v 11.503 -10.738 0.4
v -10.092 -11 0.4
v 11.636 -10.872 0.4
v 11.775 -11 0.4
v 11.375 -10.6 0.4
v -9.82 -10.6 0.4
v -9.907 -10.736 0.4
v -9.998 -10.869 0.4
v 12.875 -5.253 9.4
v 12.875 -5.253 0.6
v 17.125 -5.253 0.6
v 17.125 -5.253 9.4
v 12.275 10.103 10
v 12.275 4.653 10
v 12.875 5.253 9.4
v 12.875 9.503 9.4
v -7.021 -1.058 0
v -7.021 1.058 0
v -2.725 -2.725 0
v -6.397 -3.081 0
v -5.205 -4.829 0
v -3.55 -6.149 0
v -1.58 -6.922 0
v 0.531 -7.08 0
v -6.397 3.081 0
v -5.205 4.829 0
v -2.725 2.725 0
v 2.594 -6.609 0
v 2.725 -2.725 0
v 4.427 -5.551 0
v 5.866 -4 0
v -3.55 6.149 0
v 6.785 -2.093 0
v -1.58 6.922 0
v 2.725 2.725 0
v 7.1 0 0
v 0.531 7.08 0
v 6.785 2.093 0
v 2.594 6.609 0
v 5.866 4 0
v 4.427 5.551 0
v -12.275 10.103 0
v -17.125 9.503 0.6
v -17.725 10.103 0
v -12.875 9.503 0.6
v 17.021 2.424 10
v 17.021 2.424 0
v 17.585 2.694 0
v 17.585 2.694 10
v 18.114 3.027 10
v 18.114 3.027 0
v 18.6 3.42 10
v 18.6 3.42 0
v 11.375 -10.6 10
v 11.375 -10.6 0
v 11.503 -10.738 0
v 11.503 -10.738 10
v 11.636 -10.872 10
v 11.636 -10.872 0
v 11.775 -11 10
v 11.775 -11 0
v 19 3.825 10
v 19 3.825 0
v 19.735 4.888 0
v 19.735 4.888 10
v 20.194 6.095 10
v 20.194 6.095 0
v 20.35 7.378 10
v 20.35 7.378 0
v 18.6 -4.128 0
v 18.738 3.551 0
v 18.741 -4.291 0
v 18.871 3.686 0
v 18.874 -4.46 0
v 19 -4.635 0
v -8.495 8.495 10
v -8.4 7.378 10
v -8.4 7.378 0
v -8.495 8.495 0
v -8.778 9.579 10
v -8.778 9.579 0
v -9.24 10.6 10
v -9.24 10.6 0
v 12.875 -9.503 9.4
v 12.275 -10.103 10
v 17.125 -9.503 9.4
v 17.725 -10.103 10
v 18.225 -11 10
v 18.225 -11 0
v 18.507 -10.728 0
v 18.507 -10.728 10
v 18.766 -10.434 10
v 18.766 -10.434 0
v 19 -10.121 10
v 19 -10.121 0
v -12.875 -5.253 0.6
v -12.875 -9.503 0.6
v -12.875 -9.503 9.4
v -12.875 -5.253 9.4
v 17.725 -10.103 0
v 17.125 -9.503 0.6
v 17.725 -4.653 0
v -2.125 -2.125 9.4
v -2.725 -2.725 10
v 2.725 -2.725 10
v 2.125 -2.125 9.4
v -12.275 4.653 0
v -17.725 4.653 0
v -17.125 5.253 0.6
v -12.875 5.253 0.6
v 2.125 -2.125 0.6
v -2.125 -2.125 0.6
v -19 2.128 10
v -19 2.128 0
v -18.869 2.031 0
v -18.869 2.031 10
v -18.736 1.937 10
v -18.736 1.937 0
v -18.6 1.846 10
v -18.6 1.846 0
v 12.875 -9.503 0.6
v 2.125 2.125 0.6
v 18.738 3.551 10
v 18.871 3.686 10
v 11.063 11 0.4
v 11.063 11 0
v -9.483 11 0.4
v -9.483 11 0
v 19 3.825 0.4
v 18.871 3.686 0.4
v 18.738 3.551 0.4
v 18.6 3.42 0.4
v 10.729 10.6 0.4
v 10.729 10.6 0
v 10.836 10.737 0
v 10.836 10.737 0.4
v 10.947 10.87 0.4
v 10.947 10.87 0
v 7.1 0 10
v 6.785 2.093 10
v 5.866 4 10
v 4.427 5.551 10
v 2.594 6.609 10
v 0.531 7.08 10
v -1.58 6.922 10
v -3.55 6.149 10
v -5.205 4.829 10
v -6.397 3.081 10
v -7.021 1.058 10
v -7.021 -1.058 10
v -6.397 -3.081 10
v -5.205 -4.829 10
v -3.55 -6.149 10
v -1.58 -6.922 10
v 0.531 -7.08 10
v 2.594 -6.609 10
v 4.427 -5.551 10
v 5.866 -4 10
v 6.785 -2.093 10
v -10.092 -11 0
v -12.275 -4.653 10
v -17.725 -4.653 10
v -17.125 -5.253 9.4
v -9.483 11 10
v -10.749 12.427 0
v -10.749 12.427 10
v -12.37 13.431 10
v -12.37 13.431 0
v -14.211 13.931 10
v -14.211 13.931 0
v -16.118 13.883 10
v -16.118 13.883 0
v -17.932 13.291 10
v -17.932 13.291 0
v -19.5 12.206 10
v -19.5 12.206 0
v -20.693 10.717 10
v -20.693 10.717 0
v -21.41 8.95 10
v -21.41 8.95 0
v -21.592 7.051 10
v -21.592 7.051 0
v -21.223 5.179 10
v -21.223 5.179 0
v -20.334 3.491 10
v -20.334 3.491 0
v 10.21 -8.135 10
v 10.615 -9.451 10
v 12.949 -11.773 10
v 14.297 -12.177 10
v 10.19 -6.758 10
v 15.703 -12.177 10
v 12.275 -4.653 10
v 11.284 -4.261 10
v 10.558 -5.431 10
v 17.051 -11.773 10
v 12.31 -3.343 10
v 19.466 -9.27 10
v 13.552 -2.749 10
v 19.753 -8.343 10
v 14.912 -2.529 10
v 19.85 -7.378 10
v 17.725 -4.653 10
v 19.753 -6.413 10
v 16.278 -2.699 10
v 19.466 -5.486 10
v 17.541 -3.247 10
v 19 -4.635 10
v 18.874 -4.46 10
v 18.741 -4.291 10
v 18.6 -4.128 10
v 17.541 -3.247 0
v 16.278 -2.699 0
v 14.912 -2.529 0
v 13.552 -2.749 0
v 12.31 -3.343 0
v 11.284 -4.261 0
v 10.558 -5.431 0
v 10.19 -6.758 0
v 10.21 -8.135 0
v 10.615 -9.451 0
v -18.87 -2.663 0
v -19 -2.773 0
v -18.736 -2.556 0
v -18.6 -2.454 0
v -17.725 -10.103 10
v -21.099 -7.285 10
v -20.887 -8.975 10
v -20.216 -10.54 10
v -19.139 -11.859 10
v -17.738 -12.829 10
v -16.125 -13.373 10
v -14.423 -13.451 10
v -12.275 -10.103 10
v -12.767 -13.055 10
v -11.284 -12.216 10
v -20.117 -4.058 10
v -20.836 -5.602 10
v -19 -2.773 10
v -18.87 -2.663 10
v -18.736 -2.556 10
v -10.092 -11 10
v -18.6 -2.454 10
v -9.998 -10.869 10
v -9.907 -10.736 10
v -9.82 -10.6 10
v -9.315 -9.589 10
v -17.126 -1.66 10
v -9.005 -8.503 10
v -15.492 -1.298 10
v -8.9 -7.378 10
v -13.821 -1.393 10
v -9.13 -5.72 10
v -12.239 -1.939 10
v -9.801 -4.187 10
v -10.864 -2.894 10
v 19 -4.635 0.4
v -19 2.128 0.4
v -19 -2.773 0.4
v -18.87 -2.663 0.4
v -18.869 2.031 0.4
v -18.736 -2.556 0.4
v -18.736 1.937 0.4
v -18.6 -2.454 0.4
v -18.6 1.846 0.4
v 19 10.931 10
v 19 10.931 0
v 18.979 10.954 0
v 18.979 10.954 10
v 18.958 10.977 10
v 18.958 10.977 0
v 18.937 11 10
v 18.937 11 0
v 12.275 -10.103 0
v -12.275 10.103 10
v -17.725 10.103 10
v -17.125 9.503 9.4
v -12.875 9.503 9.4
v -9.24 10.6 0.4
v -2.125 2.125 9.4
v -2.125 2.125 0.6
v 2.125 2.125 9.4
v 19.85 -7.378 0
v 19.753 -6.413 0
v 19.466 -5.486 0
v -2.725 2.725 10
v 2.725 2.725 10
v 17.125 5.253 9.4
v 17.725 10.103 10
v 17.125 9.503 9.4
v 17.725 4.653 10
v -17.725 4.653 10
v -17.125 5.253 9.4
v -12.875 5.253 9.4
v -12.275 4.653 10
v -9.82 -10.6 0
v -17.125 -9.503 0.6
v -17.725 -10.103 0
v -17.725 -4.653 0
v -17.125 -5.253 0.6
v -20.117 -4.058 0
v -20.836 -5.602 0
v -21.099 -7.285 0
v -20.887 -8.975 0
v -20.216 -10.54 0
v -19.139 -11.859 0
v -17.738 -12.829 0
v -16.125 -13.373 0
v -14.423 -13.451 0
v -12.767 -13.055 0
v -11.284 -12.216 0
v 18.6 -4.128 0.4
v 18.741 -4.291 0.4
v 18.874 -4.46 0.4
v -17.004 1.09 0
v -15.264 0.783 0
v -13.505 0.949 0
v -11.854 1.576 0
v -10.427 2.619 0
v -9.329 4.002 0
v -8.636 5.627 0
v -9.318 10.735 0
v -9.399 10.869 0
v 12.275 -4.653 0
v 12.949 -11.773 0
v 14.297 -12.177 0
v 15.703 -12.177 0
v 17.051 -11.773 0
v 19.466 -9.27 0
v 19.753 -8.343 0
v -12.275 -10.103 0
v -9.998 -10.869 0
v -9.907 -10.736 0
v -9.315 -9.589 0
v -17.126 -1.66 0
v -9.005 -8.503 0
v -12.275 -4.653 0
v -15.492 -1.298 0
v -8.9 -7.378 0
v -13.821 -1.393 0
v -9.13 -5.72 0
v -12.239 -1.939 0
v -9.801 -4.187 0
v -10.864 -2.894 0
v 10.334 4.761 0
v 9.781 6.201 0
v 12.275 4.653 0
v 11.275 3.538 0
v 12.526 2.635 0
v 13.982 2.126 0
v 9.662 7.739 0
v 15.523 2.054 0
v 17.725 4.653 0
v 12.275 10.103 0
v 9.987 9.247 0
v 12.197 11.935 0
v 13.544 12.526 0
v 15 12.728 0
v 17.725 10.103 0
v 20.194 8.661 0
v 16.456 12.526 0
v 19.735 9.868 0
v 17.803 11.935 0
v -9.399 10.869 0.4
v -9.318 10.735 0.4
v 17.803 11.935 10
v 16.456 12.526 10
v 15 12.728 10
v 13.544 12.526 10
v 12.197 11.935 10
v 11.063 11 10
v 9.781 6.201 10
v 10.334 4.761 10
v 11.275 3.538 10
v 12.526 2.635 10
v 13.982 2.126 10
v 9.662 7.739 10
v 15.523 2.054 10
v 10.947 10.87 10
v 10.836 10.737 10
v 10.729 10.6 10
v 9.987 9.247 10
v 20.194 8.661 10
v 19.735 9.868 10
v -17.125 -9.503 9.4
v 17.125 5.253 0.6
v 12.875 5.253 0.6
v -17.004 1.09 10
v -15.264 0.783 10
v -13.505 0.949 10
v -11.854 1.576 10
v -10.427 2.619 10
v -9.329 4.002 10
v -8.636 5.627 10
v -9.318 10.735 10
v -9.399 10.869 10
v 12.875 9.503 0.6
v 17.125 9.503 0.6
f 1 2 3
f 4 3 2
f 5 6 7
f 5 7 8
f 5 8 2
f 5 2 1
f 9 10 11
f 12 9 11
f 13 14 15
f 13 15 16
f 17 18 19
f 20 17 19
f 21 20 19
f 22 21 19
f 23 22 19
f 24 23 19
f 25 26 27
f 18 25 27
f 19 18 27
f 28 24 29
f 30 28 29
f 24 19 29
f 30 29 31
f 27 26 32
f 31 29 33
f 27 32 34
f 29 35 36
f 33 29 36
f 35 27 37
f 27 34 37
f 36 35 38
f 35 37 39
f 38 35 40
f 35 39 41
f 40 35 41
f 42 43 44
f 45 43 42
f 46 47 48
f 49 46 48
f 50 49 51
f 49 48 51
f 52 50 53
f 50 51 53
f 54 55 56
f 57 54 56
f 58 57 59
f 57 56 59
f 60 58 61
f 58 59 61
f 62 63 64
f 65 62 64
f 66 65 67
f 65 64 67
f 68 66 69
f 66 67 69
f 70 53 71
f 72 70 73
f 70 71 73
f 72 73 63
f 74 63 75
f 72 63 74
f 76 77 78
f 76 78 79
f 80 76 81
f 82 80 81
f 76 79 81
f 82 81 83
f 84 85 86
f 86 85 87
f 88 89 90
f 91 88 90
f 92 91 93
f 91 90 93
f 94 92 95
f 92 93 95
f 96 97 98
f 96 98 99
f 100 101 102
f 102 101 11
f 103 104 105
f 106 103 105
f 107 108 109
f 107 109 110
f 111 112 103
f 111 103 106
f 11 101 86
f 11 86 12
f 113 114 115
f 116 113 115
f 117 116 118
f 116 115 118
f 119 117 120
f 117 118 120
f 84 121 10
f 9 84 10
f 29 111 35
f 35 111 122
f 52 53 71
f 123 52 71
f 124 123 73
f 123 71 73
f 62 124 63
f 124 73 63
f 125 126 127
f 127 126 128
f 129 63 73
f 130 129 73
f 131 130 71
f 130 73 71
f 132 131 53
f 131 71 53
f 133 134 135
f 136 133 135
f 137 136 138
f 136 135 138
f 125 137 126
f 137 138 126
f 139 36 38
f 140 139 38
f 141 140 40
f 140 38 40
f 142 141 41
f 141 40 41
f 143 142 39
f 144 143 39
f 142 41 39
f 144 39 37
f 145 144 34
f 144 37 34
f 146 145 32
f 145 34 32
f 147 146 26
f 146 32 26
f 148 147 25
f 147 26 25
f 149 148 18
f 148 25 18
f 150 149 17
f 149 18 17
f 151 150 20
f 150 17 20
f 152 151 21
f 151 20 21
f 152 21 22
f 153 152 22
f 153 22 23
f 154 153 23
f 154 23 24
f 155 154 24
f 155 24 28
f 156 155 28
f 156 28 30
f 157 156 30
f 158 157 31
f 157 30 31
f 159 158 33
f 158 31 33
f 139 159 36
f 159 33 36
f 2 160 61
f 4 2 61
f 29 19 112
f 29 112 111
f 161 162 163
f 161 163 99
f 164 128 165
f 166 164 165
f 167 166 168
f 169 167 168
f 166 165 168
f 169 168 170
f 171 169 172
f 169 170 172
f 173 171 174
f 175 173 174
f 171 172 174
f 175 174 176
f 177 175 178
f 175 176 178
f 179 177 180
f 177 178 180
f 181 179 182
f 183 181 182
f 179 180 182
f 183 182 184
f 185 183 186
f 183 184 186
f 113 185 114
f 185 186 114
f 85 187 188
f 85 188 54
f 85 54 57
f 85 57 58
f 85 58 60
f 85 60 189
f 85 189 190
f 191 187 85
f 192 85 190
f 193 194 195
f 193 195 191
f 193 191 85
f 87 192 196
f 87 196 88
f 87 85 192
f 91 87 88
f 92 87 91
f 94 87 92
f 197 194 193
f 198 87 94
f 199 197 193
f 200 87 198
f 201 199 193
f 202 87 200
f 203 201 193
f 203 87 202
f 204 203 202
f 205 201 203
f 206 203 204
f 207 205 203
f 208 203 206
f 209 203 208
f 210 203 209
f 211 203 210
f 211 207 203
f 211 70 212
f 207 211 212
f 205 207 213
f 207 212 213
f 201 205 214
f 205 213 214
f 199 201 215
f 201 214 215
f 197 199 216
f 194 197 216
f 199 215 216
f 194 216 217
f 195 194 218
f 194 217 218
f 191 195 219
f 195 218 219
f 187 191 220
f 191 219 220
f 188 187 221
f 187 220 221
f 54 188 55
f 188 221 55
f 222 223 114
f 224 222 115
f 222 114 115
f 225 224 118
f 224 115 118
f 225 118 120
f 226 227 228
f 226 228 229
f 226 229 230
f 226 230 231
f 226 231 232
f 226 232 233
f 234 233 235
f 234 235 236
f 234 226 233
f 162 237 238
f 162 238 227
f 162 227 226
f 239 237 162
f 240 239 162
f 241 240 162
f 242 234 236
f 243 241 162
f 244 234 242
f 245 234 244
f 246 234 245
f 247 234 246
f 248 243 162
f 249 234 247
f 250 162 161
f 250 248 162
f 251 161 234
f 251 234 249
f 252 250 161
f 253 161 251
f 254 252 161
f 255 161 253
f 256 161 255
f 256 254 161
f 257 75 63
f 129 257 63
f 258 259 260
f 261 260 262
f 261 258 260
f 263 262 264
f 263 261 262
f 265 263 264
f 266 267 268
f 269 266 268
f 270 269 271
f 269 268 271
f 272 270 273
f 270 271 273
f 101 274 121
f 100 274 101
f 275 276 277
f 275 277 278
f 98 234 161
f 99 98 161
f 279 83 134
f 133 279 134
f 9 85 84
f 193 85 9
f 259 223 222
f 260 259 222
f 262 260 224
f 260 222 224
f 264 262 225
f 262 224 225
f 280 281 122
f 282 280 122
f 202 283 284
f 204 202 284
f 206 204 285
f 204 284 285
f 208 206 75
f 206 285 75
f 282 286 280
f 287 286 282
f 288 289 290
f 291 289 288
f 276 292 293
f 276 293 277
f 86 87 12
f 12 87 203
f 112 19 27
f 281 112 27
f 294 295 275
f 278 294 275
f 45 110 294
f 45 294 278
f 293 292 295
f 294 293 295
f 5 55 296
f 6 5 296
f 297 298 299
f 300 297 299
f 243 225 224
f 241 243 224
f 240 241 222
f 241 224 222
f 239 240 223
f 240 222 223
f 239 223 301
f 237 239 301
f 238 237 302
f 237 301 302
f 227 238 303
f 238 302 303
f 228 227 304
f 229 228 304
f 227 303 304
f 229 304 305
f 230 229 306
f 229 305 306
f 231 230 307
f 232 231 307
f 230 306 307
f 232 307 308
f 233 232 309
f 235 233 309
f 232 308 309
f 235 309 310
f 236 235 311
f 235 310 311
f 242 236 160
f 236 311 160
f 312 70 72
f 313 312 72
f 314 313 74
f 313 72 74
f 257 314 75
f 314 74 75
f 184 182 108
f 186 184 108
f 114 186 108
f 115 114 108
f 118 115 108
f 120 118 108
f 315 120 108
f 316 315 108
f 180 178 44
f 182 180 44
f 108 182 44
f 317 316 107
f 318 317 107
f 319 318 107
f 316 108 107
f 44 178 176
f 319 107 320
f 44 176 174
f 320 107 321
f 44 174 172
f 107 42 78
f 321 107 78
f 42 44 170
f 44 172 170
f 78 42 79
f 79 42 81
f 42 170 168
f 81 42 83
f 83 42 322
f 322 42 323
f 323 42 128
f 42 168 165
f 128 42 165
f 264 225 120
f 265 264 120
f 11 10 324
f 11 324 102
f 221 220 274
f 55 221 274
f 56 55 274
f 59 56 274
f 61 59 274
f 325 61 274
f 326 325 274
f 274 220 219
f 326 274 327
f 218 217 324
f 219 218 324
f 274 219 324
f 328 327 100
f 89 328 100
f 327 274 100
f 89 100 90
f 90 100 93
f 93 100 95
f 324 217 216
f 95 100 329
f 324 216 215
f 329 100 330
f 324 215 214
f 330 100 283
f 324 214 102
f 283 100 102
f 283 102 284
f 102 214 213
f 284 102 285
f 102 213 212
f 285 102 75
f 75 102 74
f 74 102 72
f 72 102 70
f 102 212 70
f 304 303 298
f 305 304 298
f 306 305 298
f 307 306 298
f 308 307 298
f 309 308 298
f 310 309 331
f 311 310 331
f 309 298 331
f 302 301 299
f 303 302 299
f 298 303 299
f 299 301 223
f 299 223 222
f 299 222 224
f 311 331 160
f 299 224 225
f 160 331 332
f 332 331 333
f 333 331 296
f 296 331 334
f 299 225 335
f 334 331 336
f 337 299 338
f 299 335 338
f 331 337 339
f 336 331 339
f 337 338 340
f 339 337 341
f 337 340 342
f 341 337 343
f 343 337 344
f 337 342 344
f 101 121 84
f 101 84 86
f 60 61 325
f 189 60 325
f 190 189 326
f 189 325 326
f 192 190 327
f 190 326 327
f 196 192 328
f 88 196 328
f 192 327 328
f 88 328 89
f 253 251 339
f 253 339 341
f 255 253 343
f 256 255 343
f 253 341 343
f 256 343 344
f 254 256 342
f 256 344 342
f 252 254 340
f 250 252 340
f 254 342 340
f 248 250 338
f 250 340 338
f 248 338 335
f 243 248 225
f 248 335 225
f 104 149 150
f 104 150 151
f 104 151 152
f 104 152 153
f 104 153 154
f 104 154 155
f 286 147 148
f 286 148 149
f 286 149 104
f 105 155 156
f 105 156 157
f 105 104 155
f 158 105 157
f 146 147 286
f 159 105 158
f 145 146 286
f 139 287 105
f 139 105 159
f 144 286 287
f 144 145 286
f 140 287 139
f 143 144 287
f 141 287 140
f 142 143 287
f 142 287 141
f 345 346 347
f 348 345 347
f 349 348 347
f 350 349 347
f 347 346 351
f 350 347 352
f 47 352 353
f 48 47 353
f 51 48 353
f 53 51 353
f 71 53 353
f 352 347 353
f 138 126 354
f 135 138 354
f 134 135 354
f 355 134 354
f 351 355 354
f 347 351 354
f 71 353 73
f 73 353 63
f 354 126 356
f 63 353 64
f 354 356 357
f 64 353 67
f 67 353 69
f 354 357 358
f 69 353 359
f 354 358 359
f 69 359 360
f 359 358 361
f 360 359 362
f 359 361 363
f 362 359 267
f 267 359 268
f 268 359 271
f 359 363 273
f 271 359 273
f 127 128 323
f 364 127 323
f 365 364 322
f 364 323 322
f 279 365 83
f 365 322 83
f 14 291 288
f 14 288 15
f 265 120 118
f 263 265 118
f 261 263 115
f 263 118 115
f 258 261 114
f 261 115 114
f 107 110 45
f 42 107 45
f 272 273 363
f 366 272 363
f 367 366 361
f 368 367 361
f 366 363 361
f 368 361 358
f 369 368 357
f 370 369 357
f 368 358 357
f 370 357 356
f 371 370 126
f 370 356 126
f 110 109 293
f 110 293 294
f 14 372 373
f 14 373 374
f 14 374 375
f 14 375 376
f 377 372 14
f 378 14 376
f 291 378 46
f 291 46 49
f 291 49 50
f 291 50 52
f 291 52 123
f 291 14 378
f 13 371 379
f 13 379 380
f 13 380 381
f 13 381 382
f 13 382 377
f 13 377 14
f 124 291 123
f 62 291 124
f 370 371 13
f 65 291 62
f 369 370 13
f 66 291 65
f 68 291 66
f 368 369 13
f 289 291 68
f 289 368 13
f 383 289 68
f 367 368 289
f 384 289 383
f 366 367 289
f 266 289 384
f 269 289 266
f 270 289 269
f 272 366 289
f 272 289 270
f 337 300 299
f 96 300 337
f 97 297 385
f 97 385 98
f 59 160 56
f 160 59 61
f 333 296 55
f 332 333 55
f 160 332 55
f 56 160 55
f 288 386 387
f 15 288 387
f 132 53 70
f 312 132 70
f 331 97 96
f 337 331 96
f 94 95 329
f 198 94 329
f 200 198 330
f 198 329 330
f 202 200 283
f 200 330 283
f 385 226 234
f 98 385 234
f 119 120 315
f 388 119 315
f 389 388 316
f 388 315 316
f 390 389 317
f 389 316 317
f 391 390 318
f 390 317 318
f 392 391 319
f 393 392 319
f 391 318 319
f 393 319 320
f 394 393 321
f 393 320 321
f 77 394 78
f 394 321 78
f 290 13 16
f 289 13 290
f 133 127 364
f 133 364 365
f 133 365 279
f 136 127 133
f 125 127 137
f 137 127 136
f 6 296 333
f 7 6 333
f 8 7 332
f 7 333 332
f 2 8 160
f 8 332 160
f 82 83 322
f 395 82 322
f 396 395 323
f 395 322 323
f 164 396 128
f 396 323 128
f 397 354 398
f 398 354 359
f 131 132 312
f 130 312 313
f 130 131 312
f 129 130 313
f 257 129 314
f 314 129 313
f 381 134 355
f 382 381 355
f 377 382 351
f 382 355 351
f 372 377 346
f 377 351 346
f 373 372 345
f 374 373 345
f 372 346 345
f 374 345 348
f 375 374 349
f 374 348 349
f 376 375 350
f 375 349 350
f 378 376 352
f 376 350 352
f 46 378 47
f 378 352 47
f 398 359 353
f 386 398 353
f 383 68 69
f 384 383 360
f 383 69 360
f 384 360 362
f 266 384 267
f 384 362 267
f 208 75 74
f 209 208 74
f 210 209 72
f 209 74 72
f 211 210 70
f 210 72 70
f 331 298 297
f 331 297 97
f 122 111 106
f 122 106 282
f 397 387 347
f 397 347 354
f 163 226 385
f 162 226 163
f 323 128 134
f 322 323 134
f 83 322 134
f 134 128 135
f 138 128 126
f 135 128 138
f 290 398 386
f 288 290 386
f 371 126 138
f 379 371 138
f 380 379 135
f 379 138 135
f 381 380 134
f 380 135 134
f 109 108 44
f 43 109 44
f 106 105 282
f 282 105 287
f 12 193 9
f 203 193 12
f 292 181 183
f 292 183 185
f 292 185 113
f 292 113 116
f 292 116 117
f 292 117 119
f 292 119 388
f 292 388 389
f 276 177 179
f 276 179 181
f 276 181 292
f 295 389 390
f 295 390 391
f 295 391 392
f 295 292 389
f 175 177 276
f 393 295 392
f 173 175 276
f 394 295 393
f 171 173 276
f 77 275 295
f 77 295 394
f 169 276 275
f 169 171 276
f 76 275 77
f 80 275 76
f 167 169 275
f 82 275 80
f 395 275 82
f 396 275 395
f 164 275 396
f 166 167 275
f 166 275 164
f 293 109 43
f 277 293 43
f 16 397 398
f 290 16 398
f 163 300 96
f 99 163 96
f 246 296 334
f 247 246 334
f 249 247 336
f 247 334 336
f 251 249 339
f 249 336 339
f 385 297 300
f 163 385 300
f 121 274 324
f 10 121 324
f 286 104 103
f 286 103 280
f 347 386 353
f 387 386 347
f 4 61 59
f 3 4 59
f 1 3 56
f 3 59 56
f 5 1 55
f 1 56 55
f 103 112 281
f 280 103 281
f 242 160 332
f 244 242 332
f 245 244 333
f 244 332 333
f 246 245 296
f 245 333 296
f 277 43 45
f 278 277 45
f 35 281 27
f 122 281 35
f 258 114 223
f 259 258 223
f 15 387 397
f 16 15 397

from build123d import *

# Parameters (mm, degrees)
F0_W      = 4.25
F0_H      = 4.25
F1_DEPTH  = 10
F0_R      = 7.1
F2_SIZE   = 0.6
F2_2_SIZE = 0.6
F2_3_SIZE = 0.6
F2_4_SIZE = 0.6
F2_5_SIZE = 0.6
F3_SIZE   = 0.6
F3_2_SIZE = 0.6
F3_3_SIZE = 0.6
F3_4_SIZE = 0.6
F3_5_SIZE = 0.6
F4_DEPTH  = 0.4


with BuildPart() as f1:
    # F0 (on Top) → F1 (new body)
    with BuildSketch(Plane.XY):
        with BuildLine():
            ThreePointArc((19, -4.6352761092), (18.8084555729, -4.3749675743), (18.6, -4.1279937396))
            Line((18.6, -4.1279937396), (18.6, -10.6))
            Line((18.6, -10.6), (11.374924048, -10.6))
            ThreePointArc((11.374924048, -10.6), (11.5688997014, -10.8058284412), (11.7745433424, -11))
            Line((11.7745433424, -11), (18.2254566576, -11))
            ThreePointArc((18.2254566576, -11), (18.6393808679, -10.5838332395), (19, -10.12071137))
            Line((19, -10.12071137), (19, -4.6352761092))
        make_face()
        with BuildLine():
            Line((18.2254566576, -11), (11.7745433424, -11))
            ThreePointArc((11.7745433424, -11), (15, -12.2279937396), (18.2254566576, -11))
        make_face()
        with BuildLine():
            ThreePointArc((19.85, -7.3779937396), (19.6326288433, -5.9422883381), (19, -4.6352761092))
            Line((19, -4.6352761092), (19, -10.12071137))
            ThreePointArc((19, -10.12071137), (19.6326288433, -8.8136991412), (19.85, -7.3779937396))
        make_face()
        with BuildLine():
            Line((18.6, -10.6), (18.6, -4.1279937396))
            ThreePointArc((18.6, -4.1279937396), (11.7639725806, -3.7654286481), (11.374924048, -10.6))
            Line((11.374924048, -10.6), (18.6, -10.6))
        make_face()
        with Locations((15, -7.3779937396)):
            Rectangle(F0_W, F0_H, mode=Mode.SUBTRACT)
    extrude(amount=F1_DEPTH)

    # F2#2
    f2_2_edges = [f1.edges().sort_by_distance(p)[0] for p in [
        (12.875, -7.377994, 10),
        (15, -5.252994, 10),
        (17.125, -7.377994, 10),
        (15, -9.502994, 10),
    ]]
    chamfer(f2_2_edges, length=F2_2_SIZE)

    # F3#5
    f3_5_edges = [f1.edges().sort_by_distance(p)[0] for p in [
        (12.875, -7.377994, 0),
        (15, -9.502994, 0),
        (17.125, -7.377994, 0),
        (15, -5.252994, 0),
    ]]
    chamfer(f3_5_edges, length=F3_5_SIZE)


with BuildPart() as f1b:
    # F0 (on Top) → F1, piece 2 (new body)
    with BuildSketch(Plane.XY):
        with BuildLine():
            Line((-18.6, 10.6), (-9.2399066277, 10.6))
            ThreePointArc((-9.2399066277, 10.6), (-9.357736165, 10.8021518575), (-9.4826572836, 11))
            Line((-9.4826572836, 11), (-19, 11))
            Line((-19, 11), (-19, 2.1282318403))
            ThreePointArc((-19, 2.1282318403), (-18.8026143682, 1.9835406657), (-18.6, 1.8462670652))
            Line((-18.6, 1.8462670652), (-18.6, 10.6))
        make_face()
        with BuildLine():
            Line((-19, 11), (-9.4826572836, 11))
            ThreePointArc((-9.4826572836, 11), (-19.5002944126, 12.2057623961), (-19, 2.1282318403))
            Line((-19, 2.1282318403), (-19, 11))
        make_face()
        with BuildLine():
            ThreePointArc((-18.6, 1.8462670652), (-11.8535734555, 1.5762698579), (-8.4, 7.3779937396))
            ThreePointArc((-8.4, 7.3779937396), (-8.6134275132, 9.0428336332), (-9.2399066277, 10.6))
            Line((-9.2399066277, 10.6), (-18.6, 10.6))
            Line((-18.6, 10.6), (-18.6, 1.8462670652))
        make_face()
        with Locations((-15, 7.3779937396)):
            Rectangle(F0_W, F0_H, mode=Mode.SUBTRACT)
    extrude(amount=F1_DEPTH)

    # F2#5
    f2_5_edges = [f1b.edges().sort_by_distance(p)[0] for p in [
        (-17.125, 7.377994, 10),
        (-15, 5.252994, 10),
        (-12.875, 7.377994, 10),
        (-15, 9.502994, 10),
    ]]
    chamfer(f2_5_edges, length=F2_5_SIZE)

    # F3
    f3_edges = [f1b.edges().sort_by_distance(p)[0] for p in [
        (-15, 5.252994, 0),
        (-17.125, 7.377994, 0),
        (-15, 9.502994, 0),
        (-12.875, 7.377994, 0),
    ]]
    chamfer(f3_edges, length=F3_SIZE)


with BuildPart() as f1c:
    # F0 (on Top) → F1, piece 3 (new body)
    with BuildSketch(Plane.XY):
        with BuildLine():
            Line((-18.6, -10.6), (-18.6, -2.4535648387))
            ThreePointArc((-18.6, -2.4535648387), (-18.8033458722, -2.6088680151), (-19, -2.7725621638))
            Line((-19, -2.7725621638), (-19, -11))
            Line((-19, -11), (-10.0917344561, -11))
            ThreePointArc((-10.0917344561, -11), (-9.9520833938, -10.8026890454), (-9.8203595049, -10.6))
            Line((-9.8203595049, -10.6), (-18.6, -10.6))
        make_face()
        with BuildLine():
            ThreePointArc((-8.9, -7.3779937396), (-12.2386597457, -1.9387842382), (-18.6, -2.4535648387))
            Line((-18.6, -2.4535648387), (-18.6, -10.6))
            Line((-18.6, -10.6), (-9.8203595049, -10.6))
            ThreePointArc((-9.8203595049, -10.6), (-9.1346011636, -9.0534329328), (-8.9, -7.3779937396))
        make_face()
        with Locations((-15, -7.3779937396)):
            Rectangle(F0_W, F0_H, mode=Mode.SUBTRACT)
        with BuildLine():
            Line((-19, -11), (-19, -2.7725621638))
            ThreePointArc((-19, -2.7725621638), (-19.1387099333, -11.8591855552), (-10.0917344561, -11))
            Line((-10.0917344561, -11), (-19, -11))
        make_face()
    extrude(amount=F1_DEPTH)

    # F2#4
    f2_4_edges = [f1c.edges().sort_by_distance(p)[0] for p in [
        (-17.125, -7.377994, 10),
        (-15, -9.502994, 10),
        (-15, -5.252994, 10),
        (-12.875, -7.377994, 10),
    ]]
    chamfer(f2_4_edges, length=F2_4_SIZE)

    # F3#2
    f3_2_edges = [f1c.edges().sort_by_distance(p)[0] for p in [
        (-17.125, -7.377994, 0),
        (-15, -9.502994, 0),
        (-12.875, -7.377994, 0),
        (-15, -5.252994, 0),
    ]]
    chamfer(f3_2_edges, length=F3_2_SIZE)


with BuildPart() as f1d:
    # F0 (on Top) → F1, piece 4 (new body)
    with BuildSketch(Plane.XY):
        Circle(F0_R)
        Rectangle(F0_W, F0_H, mode=Mode.SUBTRACT)
    extrude(amount=F1_DEPTH)

    # F2
    f2_edges = [f1d.edges().sort_by_distance(p)[0] for p in [
        (-2.125, 0, 10),
        (0, -2.125, 10),
        (0, 2.125, 10),
        (2.125, 0, 10),
    ]]
    chamfer(f2_edges, length=F2_SIZE)

    # F3#3
    f3_3_edges = [f1d.edges().sort_by_distance(p)[0] for p in [
        (-2.125, 0, 0),
        (0, -2.125, 0),
        (2.125, 0, 0),
        (0, 2.125, 0),
    ]]
    chamfer(f3_3_edges, length=F3_3_SIZE)


with BuildPart() as f1e:
    # F0 (on Top) → F1, piece 5 (new body)
    with BuildSketch(Plane.XY):
        with BuildLine():
            ThreePointArc((11.0625426161, 11), (10.890916688, 10.8040606297), (10.7290310633, 10.6))
            Line((10.7290310633, 10.6), (18.6, 10.6))
            Line((18.6, 10.6), (18.6, 3.4204060906))
            ThreePointArc((18.6, 3.4204060906), (18.8053856658, 3.6174698487), (19, 3.8251779549))
            Line((19, 3.8251779549), (19, 10.9308095243))
            ThreePointArc((19, 10.9308095243), (18.9688794717, 10.9655410549), (18.9374573839, 11))
            Line((18.9374573839, 11), (11.0625426161, 11))
        make_face()
        with BuildLine():
            ThreePointArc((20.35, 7.3779937396), (20.0011248735, 9.2783226585), (19, 10.9308095243))
            Line((19, 10.9308095243), (19, 3.8251779549))
            ThreePointArc((19, 3.8251779549), (20.0011248735, 5.4776648207), (20.35, 7.3779937396))
        make_face()
        with BuildLine():
            ThreePointArc((18.9374573839, 11), (15, 12.7279937396), (11.0625426161, 11))
            Line((11.0625426161, 11), (18.9374573839, 11))
        make_face()
        with BuildLine():
            Line((18.6, 10.6), (10.7290310633, 10.6))
            ThreePointArc((10.7290310633, 10.6), (10.7601343704, 4.1151668298), (17.020722548, 2.4242900359))
            ThreePointArc((17.020722548, 2.4242900359), (17.8541535153, 2.8529183026), (18.6, 3.4204060906))
            Line((18.6, 3.4204060906), (18.6, 10.6))
        make_face()
        Polygon((17.125, 5.2529937396), (17.020722548, 5.2529937396), (12.875, 5.2529937396), (12.875, 9.5029937396), (17.125, 9.5029937396), align=None, mode=Mode.SUBTRACT)
    extrude(amount=F1_DEPTH)

    # F2#3
    f2_3_edges = [f1e.edges().sort_by_distance(p)[0] for p in [
        (12.875, 7.377994, 10),
        (15, 9.502994, 10),
        (15, 5.252994, 10),
        (17.125, 7.377994, 10),
    ]]
    chamfer(f2_3_edges, length=F2_3_SIZE)

    # F3#4
    f3_4_edges = [f1e.edges().sort_by_distance(p)[0] for p in [
        (12.875, 7.377994, 0),
        (15, 5.252994, 0),
        (17.125, 7.377994, 0),
        (15, 9.502994, 0),
    ]]
    chamfer(f3_4_edges, length=F3_4_SIZE)


with BuildPart() as f4:
    # F0 (on Top) → F4 (new body)
    with BuildSketch(Plane.XY):
        with BuildLine():
            Line((-18.6, -2.4535648387), (-18.6, 1.8462670652))
            ThreePointArc((-18.6, 1.8462670652), (-18.8026143682, 1.9835406657), (-19, 2.1282318403))
            Line((-19, 2.1282318403), (-19, -2.7725621638))
            ThreePointArc((-19, -2.7725621638), (-18.8033458722, -2.6088680151), (-18.6, -2.4535648387))
        make_face()
    extrude(amount=F4_DEPTH)


with BuildPart() as f4b:
    # F0 (on Top) → F4, piece 2 (new body)
    with BuildSketch(Plane.XY):
        with BuildLine():
            ThreePointArc((-9.8203595049, -10.6), (-9.9520833938, -10.8026890454), (-10.0917344561, -11))
            Line((-10.0917344561, -11), (11.7745433424, -11))
            ThreePointArc((11.7745433424, -11), (11.5688997014, -10.8058284412), (11.374924048, -10.6))
            Line((11.374924048, -10.6), (-9.8203595049, -10.6))
        make_face()
    extrude(amount=F4_DEPTH)


with BuildPart() as f4c:
    # F0 (on Top) → F4, piece 3 (new body)
    with BuildSketch(Plane.XY):
        with BuildLine():
            ThreePointArc((19, 3.8251779549), (18.8053856658, 3.6174698487), (18.6, 3.4204060906))
            Line((18.6, 3.4204060906), (18.6, -4.1279937396))
            ThreePointArc((18.6, -4.1279937396), (18.8084555729, -4.3749675743), (19, -4.6352761092))
            Line((19, -4.6352761092), (19, 3.8251779549))
        make_face()
    extrude(amount=F4_DEPTH)


with BuildPart() as f4d:
    # F0 (on Top) → F4, piece 4 (new body)
    with BuildSketch(Plane.XY):
        with BuildLine():
            ThreePointArc((-9.4826572836, 11), (-9.357736165, 10.8021518575), (-9.2399066277, 10.6))
            Line((-9.2399066277, 10.6), (10.7290310633, 10.6))
            ThreePointArc((10.7290310633, 10.6), (10.890916688, 10.8040606297), (11.0625426161, 11))
            Line((11.0625426161, 11), (-9.4826572836, 11))
        make_face()
    extrude(amount=F4_DEPTH)


solid = Compound([f1.part, f1b.part, f1c.part, f1d.part, f1e.part, f4.part, f4b.part, f4c.part, f4d.part])
